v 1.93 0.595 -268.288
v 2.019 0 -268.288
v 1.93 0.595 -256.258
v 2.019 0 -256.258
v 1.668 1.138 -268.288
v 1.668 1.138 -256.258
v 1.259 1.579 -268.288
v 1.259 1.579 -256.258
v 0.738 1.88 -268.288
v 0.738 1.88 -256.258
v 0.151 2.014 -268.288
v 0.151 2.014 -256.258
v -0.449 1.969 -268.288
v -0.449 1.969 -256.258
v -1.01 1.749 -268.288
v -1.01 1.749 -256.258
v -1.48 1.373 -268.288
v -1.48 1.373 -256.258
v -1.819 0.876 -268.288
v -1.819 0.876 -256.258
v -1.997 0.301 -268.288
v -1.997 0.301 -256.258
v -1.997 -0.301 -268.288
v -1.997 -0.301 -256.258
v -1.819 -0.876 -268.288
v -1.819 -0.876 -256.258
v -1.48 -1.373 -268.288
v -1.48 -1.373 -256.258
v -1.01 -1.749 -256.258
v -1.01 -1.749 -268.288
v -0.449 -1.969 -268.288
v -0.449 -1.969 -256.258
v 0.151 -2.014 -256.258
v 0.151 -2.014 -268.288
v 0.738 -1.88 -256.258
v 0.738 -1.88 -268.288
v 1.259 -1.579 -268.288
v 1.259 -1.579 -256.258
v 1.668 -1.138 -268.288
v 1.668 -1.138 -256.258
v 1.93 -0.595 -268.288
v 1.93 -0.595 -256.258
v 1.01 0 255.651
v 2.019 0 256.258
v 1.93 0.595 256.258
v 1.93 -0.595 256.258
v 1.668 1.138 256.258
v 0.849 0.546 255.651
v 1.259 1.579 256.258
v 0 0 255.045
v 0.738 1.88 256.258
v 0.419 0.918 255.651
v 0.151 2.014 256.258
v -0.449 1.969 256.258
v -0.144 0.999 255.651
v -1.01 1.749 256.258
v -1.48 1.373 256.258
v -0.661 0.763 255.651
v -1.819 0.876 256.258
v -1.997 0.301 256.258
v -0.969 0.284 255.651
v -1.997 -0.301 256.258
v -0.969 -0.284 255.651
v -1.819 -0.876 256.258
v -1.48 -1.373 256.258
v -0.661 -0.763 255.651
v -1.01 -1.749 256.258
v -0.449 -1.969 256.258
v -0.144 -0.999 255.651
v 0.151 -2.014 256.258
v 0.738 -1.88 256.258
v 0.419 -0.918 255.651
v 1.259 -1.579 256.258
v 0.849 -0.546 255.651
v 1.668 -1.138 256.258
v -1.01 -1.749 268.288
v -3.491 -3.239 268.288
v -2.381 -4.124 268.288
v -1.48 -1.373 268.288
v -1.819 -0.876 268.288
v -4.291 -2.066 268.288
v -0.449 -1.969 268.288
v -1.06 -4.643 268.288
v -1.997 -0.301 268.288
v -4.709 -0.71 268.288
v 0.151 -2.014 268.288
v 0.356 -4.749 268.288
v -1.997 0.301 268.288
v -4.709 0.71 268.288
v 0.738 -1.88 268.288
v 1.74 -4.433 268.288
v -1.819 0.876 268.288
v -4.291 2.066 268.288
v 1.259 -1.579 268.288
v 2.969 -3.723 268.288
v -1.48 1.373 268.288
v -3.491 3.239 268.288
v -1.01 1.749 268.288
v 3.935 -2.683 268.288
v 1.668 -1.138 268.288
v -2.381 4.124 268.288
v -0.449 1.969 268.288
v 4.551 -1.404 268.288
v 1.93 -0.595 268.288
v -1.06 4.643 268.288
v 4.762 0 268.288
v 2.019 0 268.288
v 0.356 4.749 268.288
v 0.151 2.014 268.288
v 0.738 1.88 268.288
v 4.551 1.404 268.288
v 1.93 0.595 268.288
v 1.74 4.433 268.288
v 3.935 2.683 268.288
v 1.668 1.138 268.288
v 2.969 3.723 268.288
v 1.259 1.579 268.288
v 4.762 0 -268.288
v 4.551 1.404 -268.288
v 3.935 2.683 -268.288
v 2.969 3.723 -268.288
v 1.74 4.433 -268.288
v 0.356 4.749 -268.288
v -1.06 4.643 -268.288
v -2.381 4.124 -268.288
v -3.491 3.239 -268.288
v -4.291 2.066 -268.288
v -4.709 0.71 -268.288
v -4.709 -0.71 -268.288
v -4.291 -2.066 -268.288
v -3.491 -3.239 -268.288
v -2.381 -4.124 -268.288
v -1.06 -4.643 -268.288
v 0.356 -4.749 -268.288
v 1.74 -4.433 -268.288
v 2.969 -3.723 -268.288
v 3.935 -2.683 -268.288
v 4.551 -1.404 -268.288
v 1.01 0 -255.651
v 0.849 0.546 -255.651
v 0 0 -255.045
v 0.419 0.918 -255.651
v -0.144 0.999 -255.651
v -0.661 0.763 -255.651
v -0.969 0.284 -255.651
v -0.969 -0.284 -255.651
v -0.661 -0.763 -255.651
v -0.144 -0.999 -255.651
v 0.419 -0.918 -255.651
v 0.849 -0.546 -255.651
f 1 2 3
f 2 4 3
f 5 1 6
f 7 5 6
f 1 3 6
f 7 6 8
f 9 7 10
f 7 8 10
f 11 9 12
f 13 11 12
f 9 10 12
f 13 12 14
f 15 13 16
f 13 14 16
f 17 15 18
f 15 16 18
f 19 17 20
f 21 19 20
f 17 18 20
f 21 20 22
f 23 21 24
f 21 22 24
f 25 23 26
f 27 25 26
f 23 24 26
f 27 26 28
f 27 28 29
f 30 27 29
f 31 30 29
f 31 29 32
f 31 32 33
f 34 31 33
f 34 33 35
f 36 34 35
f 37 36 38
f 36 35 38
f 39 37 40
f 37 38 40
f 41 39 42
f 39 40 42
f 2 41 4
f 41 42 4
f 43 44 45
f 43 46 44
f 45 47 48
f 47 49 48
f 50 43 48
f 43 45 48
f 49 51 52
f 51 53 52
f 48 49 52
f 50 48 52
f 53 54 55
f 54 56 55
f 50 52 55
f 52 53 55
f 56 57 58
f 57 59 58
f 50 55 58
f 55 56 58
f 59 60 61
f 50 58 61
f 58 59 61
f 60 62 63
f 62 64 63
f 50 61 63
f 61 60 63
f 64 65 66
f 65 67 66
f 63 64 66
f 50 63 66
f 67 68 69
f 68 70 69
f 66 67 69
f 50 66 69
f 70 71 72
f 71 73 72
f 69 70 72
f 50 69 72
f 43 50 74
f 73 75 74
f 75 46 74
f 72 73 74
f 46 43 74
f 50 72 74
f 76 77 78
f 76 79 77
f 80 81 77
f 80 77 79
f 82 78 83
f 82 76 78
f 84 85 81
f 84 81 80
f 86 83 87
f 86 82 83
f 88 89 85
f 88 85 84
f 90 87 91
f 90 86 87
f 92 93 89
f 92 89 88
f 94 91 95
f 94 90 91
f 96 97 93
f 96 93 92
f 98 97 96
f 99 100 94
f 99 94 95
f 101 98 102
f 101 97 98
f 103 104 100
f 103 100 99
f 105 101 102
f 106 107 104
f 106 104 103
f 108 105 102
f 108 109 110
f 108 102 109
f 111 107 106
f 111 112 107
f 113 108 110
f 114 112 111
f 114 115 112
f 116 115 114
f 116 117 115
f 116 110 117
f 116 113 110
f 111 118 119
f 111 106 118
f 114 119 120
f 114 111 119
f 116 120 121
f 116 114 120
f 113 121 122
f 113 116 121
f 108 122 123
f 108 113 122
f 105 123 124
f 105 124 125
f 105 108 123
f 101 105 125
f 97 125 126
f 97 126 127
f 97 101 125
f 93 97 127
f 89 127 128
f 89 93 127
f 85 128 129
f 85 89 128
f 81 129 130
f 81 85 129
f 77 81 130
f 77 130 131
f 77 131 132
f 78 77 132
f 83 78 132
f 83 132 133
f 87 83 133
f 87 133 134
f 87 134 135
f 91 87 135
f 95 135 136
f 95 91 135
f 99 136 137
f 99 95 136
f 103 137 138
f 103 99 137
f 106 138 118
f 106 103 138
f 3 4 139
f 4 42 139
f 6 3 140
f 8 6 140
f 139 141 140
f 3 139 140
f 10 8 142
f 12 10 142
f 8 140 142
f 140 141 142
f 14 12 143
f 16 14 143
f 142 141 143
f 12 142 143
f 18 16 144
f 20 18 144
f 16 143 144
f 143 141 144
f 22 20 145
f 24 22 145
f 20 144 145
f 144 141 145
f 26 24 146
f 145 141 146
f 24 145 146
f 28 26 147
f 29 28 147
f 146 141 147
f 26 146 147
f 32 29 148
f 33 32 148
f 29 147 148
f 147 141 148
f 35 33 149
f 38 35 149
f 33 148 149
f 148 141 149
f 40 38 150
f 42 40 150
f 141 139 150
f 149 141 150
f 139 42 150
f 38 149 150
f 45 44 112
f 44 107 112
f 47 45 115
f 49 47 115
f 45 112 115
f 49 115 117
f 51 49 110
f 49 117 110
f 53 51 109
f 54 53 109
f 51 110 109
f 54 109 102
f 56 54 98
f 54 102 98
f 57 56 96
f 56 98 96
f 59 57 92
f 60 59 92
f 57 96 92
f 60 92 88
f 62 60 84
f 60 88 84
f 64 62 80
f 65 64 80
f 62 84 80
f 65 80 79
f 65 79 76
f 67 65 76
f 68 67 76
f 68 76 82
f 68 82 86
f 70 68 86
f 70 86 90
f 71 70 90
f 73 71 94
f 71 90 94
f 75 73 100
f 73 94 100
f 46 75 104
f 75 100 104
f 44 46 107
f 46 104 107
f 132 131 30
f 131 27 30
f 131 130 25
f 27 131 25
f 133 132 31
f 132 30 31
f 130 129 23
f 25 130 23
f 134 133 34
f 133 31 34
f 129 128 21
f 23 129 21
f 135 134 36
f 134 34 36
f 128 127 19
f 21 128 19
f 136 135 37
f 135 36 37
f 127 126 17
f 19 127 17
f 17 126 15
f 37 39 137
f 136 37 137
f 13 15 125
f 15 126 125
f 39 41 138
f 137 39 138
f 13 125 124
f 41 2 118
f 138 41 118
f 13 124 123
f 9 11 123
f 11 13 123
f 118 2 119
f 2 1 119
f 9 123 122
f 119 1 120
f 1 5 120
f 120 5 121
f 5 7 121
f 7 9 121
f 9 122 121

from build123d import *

# Parameters (mm, degrees)
SKETCH1_R           = 4.7625
BOSS_EXTRUDE1_DEPTH = 268.2875


# Read off the part's stored shape, not the designer's step: #10-32 Tapped Hole1
with BuildPart() as part:
    # Sketch1 → Boss-Extrude1 (new, symmetric)
    with BuildSketch(Plane.XY):
        Circle(SKETCH1_R)
    extrude(amount=BOSS_EXTRUDE1_DEPTH, both=True)

    # #10-32 Tapped Hole1 outline → #10-32 Tapped Hole1 (revolve, cut)
    with BuildSketch(Plane.XZ):
        Polygon((2.0193, -256.25806), (0, -255.044742152), (0, -268.2875), (2.0193, -268.2875), align=None)
        Polygon((0, 268.2875), (0, 255.044742152), (2.0193, 256.25806), (2.0193, 268.2875), align=None)
    revolve(axis=Axis((0, 0, 0), (0, 0, 1)), mode=Mode.SUBTRACT)


solid = part.part
